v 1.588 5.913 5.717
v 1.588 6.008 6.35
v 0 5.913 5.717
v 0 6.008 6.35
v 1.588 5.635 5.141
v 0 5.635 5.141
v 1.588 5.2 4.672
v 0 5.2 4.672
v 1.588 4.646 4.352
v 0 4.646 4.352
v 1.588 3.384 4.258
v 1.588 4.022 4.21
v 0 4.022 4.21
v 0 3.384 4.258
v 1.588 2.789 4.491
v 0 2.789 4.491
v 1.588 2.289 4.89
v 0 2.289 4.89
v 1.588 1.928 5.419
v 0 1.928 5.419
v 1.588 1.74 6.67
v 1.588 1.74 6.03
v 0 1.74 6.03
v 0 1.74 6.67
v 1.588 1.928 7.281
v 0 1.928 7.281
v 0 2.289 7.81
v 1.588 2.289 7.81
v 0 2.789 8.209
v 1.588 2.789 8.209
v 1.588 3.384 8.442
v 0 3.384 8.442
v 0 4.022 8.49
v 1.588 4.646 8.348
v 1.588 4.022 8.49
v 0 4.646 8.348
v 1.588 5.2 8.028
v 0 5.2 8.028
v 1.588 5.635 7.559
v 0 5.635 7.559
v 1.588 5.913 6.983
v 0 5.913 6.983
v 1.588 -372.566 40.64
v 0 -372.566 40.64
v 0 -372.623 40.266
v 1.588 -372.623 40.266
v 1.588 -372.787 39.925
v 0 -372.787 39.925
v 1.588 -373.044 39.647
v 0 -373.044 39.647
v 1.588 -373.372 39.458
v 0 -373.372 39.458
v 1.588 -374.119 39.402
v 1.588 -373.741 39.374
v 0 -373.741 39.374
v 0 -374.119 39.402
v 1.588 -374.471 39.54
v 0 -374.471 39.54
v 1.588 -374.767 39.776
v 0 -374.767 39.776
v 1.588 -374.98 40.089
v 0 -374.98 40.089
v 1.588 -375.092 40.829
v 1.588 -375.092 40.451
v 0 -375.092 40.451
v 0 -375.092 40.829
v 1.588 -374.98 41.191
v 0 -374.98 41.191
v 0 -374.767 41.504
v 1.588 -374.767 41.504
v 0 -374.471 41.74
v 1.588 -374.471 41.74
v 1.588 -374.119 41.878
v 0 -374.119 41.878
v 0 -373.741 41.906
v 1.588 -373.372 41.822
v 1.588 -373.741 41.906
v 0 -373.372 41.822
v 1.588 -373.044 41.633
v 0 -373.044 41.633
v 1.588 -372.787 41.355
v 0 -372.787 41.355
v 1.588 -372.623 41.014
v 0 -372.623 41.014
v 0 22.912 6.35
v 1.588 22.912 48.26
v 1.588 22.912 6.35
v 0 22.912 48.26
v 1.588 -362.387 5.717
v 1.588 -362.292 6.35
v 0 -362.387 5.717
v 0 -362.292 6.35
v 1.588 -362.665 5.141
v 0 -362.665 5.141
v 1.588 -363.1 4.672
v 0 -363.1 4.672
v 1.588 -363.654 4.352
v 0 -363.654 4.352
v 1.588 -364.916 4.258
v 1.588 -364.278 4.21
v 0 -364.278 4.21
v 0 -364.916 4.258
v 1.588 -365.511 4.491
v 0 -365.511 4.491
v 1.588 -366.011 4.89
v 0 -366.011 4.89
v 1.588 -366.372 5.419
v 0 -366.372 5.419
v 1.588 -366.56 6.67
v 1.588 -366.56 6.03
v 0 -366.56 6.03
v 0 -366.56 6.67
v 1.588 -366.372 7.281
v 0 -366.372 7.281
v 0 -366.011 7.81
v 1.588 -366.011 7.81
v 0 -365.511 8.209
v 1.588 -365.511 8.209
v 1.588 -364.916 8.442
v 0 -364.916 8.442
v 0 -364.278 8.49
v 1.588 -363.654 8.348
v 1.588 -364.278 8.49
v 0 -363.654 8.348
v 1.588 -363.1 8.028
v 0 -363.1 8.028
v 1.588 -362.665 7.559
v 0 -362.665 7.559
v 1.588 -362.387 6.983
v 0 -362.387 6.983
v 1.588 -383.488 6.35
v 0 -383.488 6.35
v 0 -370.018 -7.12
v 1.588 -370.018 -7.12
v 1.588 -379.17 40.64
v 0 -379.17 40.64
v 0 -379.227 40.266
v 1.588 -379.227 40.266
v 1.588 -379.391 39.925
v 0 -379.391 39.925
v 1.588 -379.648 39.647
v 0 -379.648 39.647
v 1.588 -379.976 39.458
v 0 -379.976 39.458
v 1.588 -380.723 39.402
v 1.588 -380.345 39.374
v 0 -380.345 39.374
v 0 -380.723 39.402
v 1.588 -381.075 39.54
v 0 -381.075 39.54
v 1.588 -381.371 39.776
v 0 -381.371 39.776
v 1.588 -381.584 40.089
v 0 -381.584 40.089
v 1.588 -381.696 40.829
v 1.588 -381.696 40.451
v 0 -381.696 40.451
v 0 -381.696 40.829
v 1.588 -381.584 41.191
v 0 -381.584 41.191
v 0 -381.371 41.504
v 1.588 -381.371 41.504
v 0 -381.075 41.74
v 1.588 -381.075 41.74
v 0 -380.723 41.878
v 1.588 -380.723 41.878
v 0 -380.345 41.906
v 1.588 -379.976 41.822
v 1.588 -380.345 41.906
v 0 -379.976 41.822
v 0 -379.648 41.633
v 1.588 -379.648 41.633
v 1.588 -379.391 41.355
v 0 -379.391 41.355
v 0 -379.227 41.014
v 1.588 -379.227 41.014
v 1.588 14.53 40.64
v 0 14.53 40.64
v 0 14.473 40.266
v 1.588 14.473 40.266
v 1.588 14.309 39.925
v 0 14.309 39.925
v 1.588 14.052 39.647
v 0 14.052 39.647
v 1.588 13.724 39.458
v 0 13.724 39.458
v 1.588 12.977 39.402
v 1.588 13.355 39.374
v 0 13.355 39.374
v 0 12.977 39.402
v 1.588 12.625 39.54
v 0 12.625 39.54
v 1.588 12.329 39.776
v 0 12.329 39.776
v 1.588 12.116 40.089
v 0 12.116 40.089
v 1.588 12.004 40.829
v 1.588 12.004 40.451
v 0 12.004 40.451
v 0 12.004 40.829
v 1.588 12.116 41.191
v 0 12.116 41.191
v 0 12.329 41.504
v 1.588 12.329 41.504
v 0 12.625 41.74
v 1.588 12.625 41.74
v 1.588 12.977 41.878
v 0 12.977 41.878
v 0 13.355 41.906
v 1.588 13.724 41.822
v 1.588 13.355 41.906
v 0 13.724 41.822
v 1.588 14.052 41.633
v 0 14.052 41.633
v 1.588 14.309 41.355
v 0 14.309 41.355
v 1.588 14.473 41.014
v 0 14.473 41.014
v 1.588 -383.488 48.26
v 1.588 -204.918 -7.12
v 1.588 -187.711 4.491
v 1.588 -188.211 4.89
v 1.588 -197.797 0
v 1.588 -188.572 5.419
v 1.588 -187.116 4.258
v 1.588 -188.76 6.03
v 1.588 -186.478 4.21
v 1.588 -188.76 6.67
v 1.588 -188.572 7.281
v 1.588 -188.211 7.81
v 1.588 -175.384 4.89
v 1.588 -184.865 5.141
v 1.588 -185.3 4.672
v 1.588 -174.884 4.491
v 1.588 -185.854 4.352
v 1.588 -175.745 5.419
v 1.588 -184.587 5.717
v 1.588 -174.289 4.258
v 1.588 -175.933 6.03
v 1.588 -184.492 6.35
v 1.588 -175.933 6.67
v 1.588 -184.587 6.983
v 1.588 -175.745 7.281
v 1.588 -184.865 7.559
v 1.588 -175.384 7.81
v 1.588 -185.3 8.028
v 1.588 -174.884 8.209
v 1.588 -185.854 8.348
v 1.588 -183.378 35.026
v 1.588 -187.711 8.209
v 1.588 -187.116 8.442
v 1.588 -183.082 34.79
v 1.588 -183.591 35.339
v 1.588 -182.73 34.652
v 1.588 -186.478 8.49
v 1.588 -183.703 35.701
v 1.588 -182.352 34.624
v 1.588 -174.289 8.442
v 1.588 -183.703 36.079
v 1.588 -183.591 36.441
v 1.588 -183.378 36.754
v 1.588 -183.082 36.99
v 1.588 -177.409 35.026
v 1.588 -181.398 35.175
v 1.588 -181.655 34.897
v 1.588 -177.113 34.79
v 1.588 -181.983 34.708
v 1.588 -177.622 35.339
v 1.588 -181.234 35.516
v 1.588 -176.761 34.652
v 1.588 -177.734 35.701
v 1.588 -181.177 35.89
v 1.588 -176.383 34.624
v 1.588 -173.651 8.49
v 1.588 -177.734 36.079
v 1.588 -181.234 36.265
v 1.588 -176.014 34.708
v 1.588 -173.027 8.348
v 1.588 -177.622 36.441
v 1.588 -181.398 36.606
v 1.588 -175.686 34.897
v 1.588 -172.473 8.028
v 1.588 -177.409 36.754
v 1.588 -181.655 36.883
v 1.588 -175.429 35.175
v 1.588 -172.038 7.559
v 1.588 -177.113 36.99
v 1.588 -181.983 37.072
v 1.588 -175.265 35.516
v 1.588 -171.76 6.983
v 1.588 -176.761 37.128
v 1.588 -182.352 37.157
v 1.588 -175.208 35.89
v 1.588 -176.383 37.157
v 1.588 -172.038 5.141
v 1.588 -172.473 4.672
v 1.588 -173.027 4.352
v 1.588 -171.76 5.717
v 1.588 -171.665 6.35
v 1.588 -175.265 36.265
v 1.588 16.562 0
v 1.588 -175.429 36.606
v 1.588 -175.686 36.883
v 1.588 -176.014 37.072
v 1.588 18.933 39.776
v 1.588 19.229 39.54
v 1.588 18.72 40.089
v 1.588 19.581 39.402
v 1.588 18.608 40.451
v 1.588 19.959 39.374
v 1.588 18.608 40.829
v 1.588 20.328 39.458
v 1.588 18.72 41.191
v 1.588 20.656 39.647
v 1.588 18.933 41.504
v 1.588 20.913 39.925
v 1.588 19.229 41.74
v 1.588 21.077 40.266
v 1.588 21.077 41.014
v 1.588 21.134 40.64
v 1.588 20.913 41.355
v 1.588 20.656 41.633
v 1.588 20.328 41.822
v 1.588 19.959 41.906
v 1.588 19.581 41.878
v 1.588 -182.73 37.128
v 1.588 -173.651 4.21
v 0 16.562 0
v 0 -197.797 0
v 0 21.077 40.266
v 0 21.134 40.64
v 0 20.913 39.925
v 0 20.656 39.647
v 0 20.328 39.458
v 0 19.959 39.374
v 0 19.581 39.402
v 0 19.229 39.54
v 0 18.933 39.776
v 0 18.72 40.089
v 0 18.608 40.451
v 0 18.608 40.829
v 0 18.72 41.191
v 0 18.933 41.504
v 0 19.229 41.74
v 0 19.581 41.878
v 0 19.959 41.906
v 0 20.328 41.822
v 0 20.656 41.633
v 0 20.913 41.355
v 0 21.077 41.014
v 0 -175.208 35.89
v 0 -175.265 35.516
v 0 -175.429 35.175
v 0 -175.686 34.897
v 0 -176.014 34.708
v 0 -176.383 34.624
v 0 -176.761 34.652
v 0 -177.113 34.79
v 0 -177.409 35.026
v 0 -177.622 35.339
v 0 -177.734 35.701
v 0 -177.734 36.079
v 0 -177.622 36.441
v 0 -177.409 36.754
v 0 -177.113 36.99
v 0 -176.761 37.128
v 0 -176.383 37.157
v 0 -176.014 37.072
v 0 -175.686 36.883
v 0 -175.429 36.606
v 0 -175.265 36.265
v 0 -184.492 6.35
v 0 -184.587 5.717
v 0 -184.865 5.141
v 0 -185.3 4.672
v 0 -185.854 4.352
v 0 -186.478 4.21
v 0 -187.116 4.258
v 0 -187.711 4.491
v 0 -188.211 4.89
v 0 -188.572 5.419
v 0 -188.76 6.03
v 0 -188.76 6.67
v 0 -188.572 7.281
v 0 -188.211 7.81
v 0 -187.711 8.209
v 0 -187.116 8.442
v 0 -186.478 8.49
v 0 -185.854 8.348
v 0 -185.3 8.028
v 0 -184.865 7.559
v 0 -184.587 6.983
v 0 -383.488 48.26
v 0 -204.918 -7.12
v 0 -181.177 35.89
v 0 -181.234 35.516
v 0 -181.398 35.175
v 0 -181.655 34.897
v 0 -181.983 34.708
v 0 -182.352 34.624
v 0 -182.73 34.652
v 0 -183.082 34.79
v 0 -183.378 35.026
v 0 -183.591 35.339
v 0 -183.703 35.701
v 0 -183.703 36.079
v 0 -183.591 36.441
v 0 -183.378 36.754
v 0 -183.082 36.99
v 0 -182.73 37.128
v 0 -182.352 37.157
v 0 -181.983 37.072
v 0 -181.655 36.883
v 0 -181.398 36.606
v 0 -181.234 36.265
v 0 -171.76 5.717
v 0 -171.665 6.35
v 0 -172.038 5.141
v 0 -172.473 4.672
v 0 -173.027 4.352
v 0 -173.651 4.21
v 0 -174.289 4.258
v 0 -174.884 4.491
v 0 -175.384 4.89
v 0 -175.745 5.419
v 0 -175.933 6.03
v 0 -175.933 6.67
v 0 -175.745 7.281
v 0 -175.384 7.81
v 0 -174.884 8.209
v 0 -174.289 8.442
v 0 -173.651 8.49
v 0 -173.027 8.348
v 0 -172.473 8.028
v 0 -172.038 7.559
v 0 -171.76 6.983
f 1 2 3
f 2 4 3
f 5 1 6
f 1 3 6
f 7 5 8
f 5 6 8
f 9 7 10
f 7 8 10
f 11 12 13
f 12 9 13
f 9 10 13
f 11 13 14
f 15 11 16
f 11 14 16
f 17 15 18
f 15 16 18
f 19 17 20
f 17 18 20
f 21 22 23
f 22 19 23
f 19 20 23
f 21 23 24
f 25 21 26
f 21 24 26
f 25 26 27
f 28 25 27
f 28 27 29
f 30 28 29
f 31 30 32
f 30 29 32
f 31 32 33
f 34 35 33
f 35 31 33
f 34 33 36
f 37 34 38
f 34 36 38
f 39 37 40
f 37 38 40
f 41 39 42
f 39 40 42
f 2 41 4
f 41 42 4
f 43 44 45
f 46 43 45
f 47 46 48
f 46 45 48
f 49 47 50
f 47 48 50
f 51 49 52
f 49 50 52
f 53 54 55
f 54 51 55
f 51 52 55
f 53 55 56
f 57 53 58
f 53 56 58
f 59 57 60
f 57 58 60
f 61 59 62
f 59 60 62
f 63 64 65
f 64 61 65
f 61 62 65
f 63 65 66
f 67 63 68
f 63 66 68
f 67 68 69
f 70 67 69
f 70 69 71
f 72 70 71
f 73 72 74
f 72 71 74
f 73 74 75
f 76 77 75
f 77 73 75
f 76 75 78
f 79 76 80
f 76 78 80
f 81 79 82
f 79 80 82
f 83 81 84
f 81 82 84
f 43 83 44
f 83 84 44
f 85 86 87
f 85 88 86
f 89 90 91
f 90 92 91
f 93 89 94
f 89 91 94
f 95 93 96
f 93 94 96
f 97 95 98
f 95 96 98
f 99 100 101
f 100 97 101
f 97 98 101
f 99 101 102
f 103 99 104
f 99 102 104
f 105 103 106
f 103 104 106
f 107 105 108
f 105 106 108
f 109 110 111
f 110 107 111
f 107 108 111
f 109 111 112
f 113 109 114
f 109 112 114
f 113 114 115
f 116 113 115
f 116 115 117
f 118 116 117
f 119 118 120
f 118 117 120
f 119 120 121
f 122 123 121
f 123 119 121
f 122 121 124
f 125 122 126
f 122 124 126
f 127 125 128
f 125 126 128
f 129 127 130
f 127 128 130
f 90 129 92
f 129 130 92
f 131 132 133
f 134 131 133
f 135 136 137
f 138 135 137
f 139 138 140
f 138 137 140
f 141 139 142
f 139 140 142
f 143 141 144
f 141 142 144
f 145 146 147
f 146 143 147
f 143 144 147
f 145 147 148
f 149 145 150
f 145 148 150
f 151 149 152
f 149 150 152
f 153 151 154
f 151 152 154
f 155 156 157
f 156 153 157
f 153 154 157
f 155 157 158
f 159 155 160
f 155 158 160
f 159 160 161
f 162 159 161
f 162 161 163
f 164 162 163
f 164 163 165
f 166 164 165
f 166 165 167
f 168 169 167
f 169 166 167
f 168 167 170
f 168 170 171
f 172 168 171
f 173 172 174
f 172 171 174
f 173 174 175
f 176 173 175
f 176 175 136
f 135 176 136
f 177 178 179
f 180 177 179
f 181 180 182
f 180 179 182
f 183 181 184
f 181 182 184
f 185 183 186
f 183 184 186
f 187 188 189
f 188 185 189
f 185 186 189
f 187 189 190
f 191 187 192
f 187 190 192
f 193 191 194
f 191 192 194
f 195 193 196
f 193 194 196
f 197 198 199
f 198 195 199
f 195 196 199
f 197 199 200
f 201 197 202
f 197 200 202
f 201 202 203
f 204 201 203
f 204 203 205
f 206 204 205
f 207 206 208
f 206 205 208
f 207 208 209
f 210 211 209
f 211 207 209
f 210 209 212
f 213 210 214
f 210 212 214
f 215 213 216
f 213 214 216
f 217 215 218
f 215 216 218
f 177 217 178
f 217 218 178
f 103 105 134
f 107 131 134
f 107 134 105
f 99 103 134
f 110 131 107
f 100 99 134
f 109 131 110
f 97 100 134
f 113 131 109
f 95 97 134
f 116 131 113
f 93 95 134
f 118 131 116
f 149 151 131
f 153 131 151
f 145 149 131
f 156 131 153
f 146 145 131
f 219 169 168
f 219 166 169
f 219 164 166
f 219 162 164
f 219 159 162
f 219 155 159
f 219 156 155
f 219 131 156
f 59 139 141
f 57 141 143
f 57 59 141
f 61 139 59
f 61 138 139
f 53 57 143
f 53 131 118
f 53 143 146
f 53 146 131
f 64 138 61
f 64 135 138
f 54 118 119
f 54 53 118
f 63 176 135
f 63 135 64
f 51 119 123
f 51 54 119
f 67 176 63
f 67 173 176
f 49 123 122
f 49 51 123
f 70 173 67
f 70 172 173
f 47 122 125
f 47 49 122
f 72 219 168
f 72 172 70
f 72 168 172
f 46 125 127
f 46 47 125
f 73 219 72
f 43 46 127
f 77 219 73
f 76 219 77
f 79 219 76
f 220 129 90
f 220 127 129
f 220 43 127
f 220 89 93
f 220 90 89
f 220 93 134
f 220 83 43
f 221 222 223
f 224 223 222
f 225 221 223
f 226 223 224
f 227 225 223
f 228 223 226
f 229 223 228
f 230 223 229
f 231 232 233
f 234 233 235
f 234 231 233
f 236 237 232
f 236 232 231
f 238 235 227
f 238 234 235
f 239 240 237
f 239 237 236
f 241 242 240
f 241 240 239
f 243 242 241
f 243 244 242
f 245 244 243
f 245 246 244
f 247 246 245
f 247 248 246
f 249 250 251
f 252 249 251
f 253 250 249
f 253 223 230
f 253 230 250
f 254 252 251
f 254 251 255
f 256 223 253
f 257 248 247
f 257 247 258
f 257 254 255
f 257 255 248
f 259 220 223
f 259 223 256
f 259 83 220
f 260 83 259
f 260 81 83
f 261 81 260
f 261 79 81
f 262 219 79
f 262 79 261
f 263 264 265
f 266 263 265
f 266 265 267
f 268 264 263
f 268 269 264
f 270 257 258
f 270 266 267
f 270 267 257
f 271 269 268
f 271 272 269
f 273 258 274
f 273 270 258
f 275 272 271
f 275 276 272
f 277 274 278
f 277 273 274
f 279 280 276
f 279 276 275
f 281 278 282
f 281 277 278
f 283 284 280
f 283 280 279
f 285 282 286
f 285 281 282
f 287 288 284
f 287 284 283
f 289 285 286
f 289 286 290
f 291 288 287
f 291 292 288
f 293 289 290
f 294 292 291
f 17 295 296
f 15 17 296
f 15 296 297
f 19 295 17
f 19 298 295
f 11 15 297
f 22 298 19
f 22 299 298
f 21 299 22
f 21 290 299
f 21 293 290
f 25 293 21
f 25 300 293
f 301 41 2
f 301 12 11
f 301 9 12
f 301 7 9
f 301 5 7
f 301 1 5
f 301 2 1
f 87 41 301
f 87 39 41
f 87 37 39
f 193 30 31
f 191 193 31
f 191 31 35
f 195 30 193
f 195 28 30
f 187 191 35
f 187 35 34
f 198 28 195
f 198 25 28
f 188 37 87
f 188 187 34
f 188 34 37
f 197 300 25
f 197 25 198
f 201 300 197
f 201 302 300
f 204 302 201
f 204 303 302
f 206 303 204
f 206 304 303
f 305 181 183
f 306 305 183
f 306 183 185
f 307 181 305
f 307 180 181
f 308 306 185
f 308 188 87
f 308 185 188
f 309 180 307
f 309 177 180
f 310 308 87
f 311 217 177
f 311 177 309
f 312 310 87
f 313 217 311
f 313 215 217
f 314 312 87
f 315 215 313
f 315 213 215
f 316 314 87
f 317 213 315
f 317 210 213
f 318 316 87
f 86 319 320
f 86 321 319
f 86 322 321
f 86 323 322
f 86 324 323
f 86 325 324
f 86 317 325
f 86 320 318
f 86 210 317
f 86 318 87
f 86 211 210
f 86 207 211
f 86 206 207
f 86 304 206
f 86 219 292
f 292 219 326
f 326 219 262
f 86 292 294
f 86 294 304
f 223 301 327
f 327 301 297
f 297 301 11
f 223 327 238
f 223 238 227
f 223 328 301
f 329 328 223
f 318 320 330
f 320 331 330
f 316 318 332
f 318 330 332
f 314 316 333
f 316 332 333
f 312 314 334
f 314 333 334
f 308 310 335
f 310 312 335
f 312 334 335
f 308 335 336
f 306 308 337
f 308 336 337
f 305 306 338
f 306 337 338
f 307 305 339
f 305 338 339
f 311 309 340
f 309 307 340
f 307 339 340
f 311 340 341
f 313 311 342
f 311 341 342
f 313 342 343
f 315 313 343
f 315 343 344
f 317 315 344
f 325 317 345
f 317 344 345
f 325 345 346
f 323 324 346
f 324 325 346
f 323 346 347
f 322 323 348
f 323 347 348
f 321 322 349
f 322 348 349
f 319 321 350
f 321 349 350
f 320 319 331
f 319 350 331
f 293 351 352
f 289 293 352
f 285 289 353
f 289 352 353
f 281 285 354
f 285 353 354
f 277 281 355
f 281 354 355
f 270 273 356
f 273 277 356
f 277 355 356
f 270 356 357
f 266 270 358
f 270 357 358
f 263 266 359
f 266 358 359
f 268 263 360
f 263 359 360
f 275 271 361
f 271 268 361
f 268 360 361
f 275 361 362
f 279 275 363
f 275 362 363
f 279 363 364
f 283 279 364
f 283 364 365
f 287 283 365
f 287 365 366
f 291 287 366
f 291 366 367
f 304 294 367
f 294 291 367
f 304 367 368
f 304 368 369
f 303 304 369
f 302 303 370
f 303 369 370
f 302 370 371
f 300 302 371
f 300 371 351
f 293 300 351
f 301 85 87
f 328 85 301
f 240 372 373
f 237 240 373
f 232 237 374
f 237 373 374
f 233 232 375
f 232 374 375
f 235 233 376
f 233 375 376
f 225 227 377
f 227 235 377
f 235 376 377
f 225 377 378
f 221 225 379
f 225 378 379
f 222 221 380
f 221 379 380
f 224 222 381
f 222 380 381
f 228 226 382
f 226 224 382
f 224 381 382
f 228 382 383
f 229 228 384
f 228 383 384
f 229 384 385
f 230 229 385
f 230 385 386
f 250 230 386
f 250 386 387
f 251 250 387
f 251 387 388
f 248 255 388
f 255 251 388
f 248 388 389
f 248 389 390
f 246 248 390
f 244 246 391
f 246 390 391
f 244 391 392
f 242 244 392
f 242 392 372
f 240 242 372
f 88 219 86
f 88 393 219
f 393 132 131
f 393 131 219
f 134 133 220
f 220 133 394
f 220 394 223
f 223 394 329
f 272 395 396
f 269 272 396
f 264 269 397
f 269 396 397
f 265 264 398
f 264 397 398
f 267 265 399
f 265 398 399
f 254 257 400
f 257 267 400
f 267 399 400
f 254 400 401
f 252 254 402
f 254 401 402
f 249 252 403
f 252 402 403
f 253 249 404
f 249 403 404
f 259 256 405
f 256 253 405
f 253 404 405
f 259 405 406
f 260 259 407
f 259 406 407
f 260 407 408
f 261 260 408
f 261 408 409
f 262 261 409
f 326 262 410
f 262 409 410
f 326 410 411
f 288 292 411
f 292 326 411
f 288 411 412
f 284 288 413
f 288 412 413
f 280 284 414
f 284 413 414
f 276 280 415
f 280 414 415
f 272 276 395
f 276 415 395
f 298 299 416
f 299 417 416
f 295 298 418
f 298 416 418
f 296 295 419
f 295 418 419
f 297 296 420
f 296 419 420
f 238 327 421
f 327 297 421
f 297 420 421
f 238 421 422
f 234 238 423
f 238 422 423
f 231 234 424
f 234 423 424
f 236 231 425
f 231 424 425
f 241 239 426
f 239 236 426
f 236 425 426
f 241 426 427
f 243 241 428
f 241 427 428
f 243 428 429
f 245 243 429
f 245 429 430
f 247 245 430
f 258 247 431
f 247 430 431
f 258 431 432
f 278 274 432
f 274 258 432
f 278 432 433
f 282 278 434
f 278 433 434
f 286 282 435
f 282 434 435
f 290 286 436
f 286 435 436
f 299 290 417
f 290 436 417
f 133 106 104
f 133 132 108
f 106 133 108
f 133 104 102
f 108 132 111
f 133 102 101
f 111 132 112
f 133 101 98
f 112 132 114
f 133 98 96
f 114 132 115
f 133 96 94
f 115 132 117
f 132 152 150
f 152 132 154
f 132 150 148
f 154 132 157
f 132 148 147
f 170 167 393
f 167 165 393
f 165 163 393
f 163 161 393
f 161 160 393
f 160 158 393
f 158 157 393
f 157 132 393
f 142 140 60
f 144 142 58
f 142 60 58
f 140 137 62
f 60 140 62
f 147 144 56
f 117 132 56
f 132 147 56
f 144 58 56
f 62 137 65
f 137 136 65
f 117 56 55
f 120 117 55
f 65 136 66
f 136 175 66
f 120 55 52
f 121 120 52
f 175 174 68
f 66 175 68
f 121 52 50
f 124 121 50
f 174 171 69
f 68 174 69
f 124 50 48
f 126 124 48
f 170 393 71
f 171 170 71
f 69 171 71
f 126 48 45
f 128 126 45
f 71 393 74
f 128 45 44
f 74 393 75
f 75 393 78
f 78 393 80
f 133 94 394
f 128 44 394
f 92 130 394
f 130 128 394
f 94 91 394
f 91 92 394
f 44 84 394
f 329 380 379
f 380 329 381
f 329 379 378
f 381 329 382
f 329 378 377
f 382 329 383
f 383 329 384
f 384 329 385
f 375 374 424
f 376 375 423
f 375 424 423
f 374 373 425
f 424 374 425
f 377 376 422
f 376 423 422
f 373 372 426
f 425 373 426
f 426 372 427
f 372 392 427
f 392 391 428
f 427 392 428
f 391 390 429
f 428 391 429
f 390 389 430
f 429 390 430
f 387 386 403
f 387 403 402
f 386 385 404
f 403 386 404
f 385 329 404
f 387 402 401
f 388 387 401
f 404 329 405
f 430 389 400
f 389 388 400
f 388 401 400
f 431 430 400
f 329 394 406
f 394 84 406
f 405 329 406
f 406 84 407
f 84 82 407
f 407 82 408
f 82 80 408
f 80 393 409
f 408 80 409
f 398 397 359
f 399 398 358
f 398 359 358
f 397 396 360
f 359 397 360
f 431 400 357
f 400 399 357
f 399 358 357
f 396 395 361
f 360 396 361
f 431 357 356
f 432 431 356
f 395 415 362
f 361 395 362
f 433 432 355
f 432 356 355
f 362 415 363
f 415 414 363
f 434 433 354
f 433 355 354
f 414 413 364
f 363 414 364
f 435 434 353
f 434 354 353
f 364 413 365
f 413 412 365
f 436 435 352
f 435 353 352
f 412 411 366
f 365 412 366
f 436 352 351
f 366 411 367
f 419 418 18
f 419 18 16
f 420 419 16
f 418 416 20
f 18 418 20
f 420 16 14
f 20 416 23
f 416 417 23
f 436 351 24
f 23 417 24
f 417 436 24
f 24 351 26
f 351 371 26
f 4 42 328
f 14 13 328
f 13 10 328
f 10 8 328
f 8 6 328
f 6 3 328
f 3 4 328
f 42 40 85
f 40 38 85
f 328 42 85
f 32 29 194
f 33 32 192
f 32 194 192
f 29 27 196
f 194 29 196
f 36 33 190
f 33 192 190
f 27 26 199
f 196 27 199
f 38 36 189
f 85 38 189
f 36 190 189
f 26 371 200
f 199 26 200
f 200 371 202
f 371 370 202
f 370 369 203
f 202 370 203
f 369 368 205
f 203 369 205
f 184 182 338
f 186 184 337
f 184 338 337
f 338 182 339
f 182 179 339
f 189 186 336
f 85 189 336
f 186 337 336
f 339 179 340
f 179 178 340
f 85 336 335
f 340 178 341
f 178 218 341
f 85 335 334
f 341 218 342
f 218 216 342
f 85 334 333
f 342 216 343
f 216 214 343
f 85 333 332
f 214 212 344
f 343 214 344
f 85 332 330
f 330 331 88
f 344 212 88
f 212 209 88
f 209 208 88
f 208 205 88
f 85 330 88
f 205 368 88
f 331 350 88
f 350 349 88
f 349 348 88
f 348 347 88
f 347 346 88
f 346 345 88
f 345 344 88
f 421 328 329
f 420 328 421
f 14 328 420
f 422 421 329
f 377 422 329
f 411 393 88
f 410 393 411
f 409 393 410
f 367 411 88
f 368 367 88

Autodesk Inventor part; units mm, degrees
ref_plane "YZ Plane" through (0, 0, 0) normal (1, 0, 0) x (0, 1, 0)
ref_plane "XZ Plane" through (0, 0, 0) normal (0, 1, 0) x (-1, 0, 0)
ref_plane "XY Plane" through (0, 0, 0) normal (0, 0, 1) x (1, 0, 0)
sketch "Sketch1" plane through (0, 0, 0) normal (1, 0, 0) x (0, 1, 0)
  line L0 (22.9119, 0) -> (-383.4881, 0)
  line L1 (-383.4881, 0) -> (-383.4881, 48.26)
  line L2 (-383.4881, 48.26) -> (22.9119, 48.26)
  line L3 (22.9119, 48.26) -> (22.9119, 0)
  line L4 (22.9119, 0) -> (22.9119, 1.6002)
  line L5 (-383.4881, 22.987) -> (-383.4881, 2.413)
  line L6 (22.2741, 48.26) -> (-5.0281, 48.26)
  circle A0 centre (3.8619, 6.35) radius 2.1463
  circle A1 centre (-364.4381, 6.35) radius 2.1463
  circle A2 centre (-173.8111, 6.35) radius 2.1463
  circle A3 centre (-186.6381, 6.35) radius 2.1463
  circle A4 centre (19.8639, 40.64) radius 1.27
  circle A5 centre (13.2599, 40.64) radius 1.27
  circle A6 centre (-176.4781, 35.8902) radius 1.27
  circle A7 centre (-182.4471, 35.8902) radius 1.27
  circle A8 centre (-380.4401, 40.64) radius 1.27
  circle A9 centre (-373.8361, 40.64) radius 1.27
  line L7 (-383.4881, 0) -> (-370.7881, 0) construction
  line L8 (22.9119, 6.35) -> (16.5619, 0)
  line L9 (-383.4881, 6.35) -> (-370.0177, -7.1204)
  line L10 (-383.4881, 6.35) -> (-364.4381, 6.35) construction
  line L11 (-370.0177, -7.1204) -> (-204.9177, -7.1204)
  line L12 (-204.9177, -7.1204) -> (-197.7973, 0)
  point P0 (0, 0)
  point P1 (-187.7276, 0)
  dimension "d0" = 4.2926
  dimension "d1" = 6.35
  dimension "d2" = 19.05
  dimension "d3" = 4.2926
  dimension "d4" = 19.05
  dimension "d5" = 6.35
  dimension "d6" = 4.2926
  dimension "d7" = 6.35
  dimension "d8" = 4.2926
  dimension "d9" = 6.35
  dimension "d10" = 196.723
  dimension "d11" = 196.85
  dimension "d12" = 2.54
  dimension "d13" = 3.048
  dimension "d14" = 7.62
  dimension "d15" = 2.54
  dimension "d16" = 7.62
  dimension "d17" = 9.652
  dimension "d18" = 2.54
  dimension "d19" = 12.3698
  dimension "d20" = 199.39
  dimension "d21" = 2.54
  dimension "d22" = 12.3698
  dimension "d23" = 5.969
  dimension "d24" = 2.54
  dimension "d25" = 7.62
  dimension "d26" = 3.048
  dimension "d27" = 2.54
  dimension "d28" = 7.62
  dimension "d29" = 9.652
  dimension "d36" = 19.05
  dimension "d37" = 45
  dimension "d38" = 165.1
  dimension "d39" = 135
  dimension "d40" = 48.26
extrude "Extrusion1" add sketch "Sketch1" along normal blind 1.5875 contours L0 L9 L1 L2 L3 L8 | L12 L11 L9 L0
properties part number "Side Guard"
